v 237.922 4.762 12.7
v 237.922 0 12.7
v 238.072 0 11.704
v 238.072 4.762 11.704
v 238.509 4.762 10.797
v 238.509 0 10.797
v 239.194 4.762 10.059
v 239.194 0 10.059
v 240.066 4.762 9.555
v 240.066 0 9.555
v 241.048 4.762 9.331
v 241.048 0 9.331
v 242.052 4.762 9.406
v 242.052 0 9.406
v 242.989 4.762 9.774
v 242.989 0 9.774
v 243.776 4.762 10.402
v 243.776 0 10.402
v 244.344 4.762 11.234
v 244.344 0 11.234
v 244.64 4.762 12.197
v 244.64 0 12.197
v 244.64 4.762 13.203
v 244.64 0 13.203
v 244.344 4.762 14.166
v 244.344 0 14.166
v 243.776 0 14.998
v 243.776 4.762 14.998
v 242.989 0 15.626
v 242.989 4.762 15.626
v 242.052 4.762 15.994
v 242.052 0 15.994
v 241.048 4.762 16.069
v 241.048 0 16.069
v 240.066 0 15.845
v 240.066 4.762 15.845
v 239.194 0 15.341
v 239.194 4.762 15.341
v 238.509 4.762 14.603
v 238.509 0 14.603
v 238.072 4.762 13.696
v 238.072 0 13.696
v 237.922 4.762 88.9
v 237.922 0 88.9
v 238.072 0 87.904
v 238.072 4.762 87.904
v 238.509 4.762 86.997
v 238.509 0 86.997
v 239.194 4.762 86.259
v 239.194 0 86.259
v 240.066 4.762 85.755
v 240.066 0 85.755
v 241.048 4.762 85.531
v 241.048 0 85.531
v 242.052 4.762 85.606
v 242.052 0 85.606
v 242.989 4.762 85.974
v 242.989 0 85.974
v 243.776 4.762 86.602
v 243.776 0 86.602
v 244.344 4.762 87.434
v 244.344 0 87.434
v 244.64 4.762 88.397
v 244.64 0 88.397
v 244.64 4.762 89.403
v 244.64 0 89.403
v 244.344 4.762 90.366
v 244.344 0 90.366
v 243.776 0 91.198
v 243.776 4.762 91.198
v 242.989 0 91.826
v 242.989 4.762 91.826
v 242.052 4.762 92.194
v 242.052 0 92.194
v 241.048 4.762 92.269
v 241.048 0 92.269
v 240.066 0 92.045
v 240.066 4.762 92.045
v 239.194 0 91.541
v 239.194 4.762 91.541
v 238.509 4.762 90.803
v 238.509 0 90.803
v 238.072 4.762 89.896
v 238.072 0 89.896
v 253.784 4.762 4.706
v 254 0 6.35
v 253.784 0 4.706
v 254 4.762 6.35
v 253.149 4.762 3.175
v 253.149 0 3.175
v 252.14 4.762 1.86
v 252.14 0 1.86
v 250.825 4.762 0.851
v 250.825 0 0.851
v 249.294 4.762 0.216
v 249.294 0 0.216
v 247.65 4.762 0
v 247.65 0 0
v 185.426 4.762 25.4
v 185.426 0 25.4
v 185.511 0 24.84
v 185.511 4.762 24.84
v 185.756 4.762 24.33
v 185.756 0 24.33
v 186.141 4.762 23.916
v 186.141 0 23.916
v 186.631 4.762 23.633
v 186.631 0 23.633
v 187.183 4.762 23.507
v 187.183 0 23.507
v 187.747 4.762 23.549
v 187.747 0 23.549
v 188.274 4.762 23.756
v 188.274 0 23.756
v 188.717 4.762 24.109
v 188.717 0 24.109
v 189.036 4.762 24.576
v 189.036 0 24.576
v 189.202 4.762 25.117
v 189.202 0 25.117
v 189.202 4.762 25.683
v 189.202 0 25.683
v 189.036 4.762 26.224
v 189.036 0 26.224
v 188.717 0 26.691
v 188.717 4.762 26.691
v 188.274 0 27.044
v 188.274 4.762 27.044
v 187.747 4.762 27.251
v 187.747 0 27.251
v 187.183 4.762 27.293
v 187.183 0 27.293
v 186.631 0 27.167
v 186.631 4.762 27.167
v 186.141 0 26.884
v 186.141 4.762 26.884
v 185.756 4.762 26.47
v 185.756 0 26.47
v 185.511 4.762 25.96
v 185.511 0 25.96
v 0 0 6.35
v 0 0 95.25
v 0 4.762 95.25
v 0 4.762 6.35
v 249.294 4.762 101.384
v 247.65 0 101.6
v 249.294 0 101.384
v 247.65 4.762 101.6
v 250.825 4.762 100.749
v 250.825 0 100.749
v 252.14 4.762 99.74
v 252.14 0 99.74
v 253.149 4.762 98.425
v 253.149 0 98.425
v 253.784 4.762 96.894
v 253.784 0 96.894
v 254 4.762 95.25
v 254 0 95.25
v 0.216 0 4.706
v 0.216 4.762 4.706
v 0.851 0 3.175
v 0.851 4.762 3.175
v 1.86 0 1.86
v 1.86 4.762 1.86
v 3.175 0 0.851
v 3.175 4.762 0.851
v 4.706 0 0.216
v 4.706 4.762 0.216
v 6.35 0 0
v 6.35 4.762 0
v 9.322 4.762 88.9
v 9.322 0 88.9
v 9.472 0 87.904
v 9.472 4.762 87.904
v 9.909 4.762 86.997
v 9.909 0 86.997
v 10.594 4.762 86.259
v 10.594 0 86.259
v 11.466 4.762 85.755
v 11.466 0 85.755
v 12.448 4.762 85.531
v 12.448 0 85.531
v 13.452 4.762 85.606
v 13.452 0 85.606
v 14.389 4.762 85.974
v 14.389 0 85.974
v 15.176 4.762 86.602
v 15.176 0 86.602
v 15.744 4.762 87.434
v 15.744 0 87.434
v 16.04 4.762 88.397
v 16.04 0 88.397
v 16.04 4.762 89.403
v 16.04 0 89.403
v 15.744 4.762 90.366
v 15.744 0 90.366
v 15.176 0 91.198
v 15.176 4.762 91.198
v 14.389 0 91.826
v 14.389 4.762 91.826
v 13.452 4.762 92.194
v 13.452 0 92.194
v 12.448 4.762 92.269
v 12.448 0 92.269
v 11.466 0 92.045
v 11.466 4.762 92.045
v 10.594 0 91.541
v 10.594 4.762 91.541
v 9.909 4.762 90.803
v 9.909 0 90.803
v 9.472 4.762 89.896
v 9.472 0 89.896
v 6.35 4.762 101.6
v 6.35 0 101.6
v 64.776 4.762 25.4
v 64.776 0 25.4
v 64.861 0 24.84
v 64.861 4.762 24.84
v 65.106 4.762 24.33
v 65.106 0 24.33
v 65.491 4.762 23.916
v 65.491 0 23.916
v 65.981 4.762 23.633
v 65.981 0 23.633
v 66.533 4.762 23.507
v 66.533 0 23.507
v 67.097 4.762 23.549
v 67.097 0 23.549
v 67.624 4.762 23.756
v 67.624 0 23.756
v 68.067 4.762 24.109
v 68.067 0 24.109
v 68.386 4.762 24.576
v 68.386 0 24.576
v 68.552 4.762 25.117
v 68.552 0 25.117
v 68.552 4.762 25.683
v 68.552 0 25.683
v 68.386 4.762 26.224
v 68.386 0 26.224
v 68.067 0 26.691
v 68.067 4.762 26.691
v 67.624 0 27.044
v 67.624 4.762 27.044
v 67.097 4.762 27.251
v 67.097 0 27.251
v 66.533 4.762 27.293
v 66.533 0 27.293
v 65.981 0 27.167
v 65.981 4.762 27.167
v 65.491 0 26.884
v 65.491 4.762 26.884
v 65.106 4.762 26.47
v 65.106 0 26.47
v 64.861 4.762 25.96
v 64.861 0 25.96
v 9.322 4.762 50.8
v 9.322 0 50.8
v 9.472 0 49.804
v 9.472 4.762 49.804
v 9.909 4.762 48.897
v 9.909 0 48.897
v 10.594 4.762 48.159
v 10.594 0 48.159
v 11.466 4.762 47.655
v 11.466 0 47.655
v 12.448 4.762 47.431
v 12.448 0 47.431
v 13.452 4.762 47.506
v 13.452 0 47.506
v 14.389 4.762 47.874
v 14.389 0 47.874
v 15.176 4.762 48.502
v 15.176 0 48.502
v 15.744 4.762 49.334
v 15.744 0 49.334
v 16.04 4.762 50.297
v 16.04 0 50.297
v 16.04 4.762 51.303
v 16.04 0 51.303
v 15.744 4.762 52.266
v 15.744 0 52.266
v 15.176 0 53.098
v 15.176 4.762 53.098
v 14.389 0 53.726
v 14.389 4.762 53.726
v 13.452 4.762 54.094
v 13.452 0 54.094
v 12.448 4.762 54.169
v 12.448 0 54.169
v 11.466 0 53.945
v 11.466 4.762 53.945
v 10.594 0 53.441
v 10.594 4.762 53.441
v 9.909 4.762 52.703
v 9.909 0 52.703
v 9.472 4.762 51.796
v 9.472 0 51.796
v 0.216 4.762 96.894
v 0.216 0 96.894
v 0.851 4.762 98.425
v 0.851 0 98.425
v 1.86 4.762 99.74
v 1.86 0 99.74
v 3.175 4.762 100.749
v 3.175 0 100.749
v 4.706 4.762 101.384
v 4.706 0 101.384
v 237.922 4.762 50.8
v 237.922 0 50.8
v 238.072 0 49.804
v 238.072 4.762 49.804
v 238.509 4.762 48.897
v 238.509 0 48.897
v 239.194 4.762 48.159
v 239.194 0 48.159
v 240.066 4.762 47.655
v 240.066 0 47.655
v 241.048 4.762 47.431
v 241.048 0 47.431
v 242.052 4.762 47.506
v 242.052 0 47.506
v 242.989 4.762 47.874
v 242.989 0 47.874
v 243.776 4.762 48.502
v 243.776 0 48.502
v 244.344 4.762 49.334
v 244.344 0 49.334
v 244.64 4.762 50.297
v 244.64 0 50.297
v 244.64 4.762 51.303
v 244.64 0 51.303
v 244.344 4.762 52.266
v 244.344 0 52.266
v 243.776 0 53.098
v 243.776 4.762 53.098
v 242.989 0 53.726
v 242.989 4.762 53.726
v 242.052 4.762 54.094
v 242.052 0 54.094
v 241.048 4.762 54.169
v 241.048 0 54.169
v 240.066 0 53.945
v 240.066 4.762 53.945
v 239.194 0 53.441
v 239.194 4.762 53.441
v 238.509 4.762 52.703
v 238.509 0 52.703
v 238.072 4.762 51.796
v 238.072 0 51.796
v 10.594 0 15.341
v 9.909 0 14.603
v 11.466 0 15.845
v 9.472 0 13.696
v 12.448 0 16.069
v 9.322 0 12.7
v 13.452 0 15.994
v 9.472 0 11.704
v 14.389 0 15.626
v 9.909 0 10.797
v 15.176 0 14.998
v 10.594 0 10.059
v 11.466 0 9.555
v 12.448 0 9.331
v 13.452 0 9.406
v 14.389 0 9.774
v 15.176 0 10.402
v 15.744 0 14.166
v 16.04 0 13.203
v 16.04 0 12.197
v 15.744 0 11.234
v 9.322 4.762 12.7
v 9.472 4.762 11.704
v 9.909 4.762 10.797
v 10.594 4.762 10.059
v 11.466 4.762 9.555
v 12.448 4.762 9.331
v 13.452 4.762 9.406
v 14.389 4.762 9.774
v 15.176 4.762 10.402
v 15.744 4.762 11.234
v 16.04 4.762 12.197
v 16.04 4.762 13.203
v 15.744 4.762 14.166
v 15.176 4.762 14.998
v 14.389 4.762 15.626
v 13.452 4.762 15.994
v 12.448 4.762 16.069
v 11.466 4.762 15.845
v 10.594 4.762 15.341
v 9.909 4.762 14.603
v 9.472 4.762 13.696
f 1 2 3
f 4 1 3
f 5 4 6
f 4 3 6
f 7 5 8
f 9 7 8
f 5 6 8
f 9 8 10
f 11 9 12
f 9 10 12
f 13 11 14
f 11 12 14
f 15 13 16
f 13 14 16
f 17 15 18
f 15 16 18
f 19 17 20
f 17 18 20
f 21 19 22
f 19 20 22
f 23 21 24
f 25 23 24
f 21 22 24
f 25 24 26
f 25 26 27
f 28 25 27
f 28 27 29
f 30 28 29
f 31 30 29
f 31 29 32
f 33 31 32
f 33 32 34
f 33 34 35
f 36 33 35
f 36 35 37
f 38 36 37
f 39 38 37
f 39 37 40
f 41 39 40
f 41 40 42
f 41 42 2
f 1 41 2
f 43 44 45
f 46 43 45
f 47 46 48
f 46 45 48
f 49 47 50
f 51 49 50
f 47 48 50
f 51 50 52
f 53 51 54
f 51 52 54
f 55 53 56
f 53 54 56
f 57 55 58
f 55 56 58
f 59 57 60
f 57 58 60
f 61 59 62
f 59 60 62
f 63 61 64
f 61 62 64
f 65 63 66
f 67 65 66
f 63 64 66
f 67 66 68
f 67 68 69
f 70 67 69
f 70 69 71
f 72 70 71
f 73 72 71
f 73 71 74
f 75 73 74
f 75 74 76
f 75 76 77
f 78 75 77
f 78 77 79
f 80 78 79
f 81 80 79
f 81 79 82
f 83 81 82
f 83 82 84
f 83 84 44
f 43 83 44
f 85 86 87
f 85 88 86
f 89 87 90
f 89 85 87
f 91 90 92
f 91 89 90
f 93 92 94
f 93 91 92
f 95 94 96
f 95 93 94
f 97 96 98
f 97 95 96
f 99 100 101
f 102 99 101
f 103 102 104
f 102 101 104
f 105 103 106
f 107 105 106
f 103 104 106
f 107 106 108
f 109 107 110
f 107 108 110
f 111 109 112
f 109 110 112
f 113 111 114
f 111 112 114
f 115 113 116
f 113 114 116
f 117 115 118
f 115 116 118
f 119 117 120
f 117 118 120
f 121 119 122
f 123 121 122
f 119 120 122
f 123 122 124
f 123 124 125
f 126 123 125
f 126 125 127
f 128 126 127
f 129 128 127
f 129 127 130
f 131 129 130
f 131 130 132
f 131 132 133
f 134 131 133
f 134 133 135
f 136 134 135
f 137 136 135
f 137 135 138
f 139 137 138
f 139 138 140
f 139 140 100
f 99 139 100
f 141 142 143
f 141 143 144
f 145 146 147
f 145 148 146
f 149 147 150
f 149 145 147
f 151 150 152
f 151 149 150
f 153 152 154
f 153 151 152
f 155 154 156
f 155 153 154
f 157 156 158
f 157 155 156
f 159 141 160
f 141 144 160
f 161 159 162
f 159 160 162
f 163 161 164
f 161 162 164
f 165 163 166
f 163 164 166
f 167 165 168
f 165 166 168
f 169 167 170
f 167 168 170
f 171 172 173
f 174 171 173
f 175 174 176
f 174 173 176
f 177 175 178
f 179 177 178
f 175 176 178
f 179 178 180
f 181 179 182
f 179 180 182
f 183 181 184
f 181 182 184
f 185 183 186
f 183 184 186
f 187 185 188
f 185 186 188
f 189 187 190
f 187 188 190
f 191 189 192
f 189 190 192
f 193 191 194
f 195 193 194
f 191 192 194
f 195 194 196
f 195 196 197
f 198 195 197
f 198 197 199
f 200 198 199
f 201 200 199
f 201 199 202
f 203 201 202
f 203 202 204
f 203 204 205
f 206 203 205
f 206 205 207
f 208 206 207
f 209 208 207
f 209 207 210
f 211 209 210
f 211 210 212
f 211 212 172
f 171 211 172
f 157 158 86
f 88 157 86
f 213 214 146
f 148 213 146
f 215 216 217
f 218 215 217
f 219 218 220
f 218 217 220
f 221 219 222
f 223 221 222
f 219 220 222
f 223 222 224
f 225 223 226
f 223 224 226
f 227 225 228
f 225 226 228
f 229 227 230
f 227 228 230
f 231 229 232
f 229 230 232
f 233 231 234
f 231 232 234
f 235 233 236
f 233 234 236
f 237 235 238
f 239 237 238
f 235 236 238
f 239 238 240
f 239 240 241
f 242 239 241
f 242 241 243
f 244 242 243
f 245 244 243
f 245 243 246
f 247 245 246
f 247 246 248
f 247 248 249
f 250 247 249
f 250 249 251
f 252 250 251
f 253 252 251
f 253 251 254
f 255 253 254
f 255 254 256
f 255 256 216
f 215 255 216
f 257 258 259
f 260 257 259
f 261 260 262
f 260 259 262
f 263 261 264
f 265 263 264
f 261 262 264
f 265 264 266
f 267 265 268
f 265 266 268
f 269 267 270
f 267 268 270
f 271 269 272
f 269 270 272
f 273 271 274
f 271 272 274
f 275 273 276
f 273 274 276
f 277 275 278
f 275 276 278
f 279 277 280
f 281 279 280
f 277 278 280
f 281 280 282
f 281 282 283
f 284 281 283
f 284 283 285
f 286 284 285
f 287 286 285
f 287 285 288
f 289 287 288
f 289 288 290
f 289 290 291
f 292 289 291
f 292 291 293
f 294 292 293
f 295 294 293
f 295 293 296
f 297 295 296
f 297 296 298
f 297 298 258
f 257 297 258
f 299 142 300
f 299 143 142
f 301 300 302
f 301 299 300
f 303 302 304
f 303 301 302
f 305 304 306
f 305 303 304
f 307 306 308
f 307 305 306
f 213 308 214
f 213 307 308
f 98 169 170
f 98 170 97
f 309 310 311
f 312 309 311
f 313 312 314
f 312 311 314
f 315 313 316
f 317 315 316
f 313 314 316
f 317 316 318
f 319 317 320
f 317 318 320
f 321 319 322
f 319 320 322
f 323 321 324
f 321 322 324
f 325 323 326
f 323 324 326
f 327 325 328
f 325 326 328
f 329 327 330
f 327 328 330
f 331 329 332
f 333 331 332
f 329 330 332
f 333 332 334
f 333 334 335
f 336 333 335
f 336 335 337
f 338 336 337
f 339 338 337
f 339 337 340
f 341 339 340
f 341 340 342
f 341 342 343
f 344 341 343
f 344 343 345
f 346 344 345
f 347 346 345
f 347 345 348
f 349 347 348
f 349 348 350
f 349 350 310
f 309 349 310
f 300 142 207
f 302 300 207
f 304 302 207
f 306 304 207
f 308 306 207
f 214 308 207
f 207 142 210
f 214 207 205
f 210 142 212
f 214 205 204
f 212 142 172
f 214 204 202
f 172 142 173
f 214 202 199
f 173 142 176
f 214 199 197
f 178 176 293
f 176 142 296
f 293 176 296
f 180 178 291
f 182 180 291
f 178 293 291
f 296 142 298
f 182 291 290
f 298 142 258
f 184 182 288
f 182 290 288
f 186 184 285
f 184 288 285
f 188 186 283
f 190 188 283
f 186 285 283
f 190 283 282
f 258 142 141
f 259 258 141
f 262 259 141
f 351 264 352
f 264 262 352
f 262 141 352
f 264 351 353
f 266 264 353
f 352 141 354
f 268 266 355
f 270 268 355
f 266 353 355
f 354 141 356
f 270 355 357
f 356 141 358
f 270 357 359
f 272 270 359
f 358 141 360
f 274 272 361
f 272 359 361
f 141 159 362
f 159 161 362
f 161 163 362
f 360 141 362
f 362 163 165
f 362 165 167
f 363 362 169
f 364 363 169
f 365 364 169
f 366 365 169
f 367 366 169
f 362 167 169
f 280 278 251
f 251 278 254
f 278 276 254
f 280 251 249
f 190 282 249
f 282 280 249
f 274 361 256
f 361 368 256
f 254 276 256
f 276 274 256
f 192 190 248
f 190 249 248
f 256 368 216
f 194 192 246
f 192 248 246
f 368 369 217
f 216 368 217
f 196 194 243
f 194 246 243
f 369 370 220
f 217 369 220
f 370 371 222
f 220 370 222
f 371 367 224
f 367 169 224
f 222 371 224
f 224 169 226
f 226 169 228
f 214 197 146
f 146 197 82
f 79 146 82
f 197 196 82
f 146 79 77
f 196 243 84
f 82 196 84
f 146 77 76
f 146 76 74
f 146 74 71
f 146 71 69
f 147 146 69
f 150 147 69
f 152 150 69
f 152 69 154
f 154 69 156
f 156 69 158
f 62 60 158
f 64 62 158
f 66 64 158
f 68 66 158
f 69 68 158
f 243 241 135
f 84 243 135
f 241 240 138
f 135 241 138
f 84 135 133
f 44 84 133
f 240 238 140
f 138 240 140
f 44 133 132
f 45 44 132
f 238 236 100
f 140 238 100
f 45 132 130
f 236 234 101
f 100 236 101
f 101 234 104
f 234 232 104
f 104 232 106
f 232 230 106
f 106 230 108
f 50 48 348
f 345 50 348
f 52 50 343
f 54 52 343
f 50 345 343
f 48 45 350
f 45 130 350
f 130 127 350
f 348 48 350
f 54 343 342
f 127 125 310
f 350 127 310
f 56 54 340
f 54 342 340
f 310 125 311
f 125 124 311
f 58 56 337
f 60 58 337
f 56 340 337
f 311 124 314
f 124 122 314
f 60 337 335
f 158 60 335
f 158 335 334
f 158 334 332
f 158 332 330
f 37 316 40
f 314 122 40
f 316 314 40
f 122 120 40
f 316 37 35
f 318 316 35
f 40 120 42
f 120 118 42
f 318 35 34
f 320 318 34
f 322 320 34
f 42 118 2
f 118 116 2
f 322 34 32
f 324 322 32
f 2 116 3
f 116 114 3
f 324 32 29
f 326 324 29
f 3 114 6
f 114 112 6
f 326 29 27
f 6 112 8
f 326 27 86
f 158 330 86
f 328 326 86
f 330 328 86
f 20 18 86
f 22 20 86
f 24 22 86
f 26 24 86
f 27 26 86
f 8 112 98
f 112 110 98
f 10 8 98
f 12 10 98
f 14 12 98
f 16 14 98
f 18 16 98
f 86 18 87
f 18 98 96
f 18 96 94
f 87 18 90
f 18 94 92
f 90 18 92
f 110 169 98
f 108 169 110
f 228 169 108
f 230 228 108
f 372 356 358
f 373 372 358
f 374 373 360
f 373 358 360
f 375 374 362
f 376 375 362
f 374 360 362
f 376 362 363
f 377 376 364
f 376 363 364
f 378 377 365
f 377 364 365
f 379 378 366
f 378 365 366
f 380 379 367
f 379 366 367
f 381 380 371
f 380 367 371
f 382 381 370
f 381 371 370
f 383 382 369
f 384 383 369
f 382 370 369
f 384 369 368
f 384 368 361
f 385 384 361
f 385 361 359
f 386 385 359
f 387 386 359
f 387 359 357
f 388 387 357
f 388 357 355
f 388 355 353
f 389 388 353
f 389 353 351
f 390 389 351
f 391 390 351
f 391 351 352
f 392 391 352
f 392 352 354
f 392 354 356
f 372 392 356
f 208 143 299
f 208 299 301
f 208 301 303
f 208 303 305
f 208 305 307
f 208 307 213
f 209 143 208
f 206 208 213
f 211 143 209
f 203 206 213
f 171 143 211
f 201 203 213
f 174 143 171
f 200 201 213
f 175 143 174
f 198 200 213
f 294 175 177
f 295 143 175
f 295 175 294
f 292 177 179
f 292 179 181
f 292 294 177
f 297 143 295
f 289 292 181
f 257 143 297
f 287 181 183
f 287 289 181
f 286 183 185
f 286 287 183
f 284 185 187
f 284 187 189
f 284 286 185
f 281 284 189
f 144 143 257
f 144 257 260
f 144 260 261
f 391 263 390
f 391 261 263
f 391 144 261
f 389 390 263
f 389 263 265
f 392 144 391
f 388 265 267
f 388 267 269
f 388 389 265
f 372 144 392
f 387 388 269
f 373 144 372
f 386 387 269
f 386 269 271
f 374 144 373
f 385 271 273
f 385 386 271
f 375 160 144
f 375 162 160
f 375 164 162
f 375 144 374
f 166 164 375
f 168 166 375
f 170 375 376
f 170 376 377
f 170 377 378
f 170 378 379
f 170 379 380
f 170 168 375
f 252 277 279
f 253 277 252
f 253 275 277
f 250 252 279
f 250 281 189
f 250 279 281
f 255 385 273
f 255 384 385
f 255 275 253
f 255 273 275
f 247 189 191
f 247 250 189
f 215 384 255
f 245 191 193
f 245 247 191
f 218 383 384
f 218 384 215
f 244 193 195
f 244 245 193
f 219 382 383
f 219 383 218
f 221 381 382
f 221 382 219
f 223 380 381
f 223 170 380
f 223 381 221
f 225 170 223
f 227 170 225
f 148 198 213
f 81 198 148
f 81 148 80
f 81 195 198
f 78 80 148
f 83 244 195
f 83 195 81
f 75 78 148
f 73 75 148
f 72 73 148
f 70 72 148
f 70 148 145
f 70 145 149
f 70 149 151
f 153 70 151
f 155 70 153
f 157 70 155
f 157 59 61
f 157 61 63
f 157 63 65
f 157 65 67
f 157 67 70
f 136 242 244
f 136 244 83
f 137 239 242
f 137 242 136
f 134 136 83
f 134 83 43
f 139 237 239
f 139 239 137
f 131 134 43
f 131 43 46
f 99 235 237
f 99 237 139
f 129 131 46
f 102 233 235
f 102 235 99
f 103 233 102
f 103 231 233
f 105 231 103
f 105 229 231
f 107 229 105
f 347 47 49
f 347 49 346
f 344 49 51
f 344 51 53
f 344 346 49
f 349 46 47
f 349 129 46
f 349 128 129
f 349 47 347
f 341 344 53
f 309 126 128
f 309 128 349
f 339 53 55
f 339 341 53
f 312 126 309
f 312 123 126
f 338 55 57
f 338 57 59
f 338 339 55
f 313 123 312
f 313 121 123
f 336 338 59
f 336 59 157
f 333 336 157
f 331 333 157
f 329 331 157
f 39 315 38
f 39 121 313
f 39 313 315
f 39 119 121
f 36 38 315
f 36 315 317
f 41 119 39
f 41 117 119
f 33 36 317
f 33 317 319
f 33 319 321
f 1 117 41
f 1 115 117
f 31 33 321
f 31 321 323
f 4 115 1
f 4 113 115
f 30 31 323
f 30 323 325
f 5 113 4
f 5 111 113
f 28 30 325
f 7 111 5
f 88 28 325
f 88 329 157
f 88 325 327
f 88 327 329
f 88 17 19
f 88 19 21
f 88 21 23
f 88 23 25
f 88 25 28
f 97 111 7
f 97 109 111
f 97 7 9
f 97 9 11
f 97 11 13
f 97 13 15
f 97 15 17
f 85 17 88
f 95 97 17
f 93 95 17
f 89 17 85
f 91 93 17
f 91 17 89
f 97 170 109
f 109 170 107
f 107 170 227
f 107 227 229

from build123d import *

# Parameters (mm, degrees)
SKETCH2_W               = 254
SKETCH2_H               = 101.6
BOSS_EXTRUDE1_DEPTH     = 4.7625
FILLET1_R               = 6.35
F_6_CLEARANCE_HOLE1_D   = 3.7973
F_1_4_CLEARANCE_HOLE1_D = 6.7564


with BuildPart() as part:
    # Sketch2 → Boss-Extrude1 (new body)
    with BuildSketch(Plane(origin=(0, 0, 0), x_dir=(1, 0, 0), z_dir=(0, 1, 0))):
        with Locations((127, -50.8)):
            Rectangle(SKETCH2_W, SKETCH2_H)
    extrude(amount=BOSS_EXTRUDE1_DEPTH)

    # Fillet1
    fillet1_edges = [part.edges().sort_by_distance(p)[0] for p in [
        (0, 2.38125, 0),
        (254, 2.38125, 0),
        (254, 2.38125, 101.6),
        (0, 2.38125, 101.6),
    ]]
    fillet(fillet1_edges, radius=FILLET1_R)

    # #6 Clearance Hole1 (through all)
    with Locations(Plane(origin=(0, 4.7625, 0), x_dir=(1, 0, 0), z_dir=(0, 1, 0))):
        with Locations((66.675, -25.4), (187.325, -25.4)):
            Hole(F_6_CLEARANCE_HOLE1_D / 2)

    # 1/4 Clearance Hole1 (through all)
    with Locations(Plane(origin=(0, 4.7625, 0), x_dir=(1, 0, 0), z_dir=(0, 1, 0))):
        with Locations((12.7, -12.7), (12.7, -88.9), (241.3, -88.9), (241.3, -12.7), (12.7, -50.8), (241.3, -50.8)):
            Hole(F_1_4_CLEARANCE_HOLE1_D / 2)


solid = part.part
